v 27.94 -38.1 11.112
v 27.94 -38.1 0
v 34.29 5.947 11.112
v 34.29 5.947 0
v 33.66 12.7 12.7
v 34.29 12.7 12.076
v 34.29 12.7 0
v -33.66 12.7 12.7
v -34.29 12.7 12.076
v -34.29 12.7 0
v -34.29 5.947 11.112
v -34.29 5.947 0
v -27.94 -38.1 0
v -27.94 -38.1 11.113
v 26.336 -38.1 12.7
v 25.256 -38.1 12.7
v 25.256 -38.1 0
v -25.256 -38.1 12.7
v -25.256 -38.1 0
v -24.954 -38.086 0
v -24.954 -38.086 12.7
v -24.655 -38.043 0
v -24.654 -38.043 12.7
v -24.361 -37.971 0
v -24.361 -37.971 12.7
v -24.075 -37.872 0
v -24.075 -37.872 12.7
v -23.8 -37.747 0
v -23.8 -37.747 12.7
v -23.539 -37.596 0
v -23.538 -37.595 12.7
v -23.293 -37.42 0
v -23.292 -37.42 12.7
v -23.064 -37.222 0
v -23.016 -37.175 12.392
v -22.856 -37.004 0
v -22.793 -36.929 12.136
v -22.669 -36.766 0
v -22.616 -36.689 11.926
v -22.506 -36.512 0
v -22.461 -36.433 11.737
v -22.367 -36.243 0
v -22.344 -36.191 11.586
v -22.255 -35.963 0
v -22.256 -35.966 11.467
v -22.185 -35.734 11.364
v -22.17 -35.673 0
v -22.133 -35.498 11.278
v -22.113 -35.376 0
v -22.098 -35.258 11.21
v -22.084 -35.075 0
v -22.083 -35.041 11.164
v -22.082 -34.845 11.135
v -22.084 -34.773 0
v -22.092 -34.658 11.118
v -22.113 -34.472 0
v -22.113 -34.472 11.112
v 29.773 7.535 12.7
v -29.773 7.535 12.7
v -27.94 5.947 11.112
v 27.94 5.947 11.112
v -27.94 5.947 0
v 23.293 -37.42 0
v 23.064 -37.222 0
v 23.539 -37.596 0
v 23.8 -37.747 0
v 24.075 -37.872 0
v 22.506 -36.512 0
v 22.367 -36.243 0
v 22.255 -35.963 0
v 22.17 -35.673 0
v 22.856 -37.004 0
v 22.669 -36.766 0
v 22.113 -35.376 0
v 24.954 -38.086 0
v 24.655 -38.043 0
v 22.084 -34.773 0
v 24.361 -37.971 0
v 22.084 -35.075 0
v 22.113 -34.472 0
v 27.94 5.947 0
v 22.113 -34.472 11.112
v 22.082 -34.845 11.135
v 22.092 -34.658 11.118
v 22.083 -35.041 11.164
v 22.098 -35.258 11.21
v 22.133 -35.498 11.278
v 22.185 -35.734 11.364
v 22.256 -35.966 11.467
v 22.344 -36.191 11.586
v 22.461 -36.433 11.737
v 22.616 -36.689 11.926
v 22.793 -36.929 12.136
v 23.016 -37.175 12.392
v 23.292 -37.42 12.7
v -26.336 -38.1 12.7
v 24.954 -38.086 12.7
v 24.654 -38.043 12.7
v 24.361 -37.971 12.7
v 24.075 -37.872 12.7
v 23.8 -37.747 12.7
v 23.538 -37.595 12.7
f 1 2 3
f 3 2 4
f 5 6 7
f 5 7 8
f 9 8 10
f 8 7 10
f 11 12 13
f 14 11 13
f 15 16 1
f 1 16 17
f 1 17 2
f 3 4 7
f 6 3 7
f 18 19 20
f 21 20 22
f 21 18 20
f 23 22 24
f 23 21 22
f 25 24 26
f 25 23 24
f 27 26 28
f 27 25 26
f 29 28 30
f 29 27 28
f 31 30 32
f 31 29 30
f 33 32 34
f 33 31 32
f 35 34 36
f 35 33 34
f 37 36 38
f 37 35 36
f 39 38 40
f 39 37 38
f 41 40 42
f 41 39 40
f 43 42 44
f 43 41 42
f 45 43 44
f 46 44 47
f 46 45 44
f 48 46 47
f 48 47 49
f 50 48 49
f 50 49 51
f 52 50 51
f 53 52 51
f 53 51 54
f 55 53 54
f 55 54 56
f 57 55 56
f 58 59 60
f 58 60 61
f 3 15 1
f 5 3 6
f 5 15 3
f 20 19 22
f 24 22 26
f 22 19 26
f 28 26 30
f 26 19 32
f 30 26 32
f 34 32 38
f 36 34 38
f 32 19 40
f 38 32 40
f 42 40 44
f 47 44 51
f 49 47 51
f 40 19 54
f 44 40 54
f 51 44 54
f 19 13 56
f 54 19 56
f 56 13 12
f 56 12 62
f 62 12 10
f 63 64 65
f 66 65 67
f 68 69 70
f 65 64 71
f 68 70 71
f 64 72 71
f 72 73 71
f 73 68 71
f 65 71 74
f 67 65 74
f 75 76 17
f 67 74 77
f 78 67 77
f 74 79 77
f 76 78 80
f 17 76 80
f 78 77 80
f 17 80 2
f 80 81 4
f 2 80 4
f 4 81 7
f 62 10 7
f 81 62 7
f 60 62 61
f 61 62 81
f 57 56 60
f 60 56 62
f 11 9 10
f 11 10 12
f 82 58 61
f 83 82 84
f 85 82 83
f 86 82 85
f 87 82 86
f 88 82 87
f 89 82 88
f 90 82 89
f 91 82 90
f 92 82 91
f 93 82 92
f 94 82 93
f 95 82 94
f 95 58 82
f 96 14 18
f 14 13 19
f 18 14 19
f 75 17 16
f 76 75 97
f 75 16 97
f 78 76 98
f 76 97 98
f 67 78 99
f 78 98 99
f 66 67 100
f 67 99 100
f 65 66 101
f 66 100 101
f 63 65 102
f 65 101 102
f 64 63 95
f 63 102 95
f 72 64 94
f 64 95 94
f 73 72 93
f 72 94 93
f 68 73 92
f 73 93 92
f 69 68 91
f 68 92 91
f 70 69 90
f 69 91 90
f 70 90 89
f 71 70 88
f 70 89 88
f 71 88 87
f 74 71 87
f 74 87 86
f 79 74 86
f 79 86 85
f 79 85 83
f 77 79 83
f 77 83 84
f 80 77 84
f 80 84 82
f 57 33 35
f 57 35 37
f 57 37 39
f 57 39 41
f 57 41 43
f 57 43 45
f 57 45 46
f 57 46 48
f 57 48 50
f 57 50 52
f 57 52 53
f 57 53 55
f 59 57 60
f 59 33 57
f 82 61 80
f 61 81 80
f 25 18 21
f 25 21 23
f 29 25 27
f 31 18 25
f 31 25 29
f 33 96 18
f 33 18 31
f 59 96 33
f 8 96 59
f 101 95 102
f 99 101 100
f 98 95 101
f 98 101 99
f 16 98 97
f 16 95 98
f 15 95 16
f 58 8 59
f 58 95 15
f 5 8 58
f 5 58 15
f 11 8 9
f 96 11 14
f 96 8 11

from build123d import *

# Parameters (mm, degrees)
F1_DEPTH = 12.7
F2_SIZE  = 1.5875
F3_R     = 3.175


with BuildPart() as f1:
    # F0 (on Top) → F1 (new body)
    with BuildSketch(Plane.XY):
        Polygon((34.29, 12.7), (-34.29, 12.7), (-34.29, 5.94713), (-27.94, 5.94713), (27.94, 5.94713), (34.29, 5.94713), align=None)
        Polygon((-27.94, 5.94713), (-34.29, 5.94713), (-27.94, -38.1), (-21.59, -38.1), align=None)
        Polygon((27.94, -38.1), (34.29, 5.94713), (27.94, 5.94713), (21.59, -38.1), align=None)
    extrude(amount=F1_DEPTH)

    # F2
    f2_edges = [f1.edges().sort_by_distance(p)[0] for p in [
        (-24.765, -16.076435, 12.7),
        (-31.115, -16.076435, 12.7),
        (0, 5.94713, 12.7),
        (24.765, -16.076435, 12.7),
        (31.115, -16.076435, 12.7),
    ]]
    chamfer(f2_edges, length=F2_SIZE)

    # F3
    f3_edges = [f1.edges().sort_by_distance(p)[0] for p in [
        (-21.59, -38.1, 5.55625),
        (21.59, -38.1, 5.55625),
    ]]
    fillet(f3_edges, radius=F3_R)


solid = f1.part
